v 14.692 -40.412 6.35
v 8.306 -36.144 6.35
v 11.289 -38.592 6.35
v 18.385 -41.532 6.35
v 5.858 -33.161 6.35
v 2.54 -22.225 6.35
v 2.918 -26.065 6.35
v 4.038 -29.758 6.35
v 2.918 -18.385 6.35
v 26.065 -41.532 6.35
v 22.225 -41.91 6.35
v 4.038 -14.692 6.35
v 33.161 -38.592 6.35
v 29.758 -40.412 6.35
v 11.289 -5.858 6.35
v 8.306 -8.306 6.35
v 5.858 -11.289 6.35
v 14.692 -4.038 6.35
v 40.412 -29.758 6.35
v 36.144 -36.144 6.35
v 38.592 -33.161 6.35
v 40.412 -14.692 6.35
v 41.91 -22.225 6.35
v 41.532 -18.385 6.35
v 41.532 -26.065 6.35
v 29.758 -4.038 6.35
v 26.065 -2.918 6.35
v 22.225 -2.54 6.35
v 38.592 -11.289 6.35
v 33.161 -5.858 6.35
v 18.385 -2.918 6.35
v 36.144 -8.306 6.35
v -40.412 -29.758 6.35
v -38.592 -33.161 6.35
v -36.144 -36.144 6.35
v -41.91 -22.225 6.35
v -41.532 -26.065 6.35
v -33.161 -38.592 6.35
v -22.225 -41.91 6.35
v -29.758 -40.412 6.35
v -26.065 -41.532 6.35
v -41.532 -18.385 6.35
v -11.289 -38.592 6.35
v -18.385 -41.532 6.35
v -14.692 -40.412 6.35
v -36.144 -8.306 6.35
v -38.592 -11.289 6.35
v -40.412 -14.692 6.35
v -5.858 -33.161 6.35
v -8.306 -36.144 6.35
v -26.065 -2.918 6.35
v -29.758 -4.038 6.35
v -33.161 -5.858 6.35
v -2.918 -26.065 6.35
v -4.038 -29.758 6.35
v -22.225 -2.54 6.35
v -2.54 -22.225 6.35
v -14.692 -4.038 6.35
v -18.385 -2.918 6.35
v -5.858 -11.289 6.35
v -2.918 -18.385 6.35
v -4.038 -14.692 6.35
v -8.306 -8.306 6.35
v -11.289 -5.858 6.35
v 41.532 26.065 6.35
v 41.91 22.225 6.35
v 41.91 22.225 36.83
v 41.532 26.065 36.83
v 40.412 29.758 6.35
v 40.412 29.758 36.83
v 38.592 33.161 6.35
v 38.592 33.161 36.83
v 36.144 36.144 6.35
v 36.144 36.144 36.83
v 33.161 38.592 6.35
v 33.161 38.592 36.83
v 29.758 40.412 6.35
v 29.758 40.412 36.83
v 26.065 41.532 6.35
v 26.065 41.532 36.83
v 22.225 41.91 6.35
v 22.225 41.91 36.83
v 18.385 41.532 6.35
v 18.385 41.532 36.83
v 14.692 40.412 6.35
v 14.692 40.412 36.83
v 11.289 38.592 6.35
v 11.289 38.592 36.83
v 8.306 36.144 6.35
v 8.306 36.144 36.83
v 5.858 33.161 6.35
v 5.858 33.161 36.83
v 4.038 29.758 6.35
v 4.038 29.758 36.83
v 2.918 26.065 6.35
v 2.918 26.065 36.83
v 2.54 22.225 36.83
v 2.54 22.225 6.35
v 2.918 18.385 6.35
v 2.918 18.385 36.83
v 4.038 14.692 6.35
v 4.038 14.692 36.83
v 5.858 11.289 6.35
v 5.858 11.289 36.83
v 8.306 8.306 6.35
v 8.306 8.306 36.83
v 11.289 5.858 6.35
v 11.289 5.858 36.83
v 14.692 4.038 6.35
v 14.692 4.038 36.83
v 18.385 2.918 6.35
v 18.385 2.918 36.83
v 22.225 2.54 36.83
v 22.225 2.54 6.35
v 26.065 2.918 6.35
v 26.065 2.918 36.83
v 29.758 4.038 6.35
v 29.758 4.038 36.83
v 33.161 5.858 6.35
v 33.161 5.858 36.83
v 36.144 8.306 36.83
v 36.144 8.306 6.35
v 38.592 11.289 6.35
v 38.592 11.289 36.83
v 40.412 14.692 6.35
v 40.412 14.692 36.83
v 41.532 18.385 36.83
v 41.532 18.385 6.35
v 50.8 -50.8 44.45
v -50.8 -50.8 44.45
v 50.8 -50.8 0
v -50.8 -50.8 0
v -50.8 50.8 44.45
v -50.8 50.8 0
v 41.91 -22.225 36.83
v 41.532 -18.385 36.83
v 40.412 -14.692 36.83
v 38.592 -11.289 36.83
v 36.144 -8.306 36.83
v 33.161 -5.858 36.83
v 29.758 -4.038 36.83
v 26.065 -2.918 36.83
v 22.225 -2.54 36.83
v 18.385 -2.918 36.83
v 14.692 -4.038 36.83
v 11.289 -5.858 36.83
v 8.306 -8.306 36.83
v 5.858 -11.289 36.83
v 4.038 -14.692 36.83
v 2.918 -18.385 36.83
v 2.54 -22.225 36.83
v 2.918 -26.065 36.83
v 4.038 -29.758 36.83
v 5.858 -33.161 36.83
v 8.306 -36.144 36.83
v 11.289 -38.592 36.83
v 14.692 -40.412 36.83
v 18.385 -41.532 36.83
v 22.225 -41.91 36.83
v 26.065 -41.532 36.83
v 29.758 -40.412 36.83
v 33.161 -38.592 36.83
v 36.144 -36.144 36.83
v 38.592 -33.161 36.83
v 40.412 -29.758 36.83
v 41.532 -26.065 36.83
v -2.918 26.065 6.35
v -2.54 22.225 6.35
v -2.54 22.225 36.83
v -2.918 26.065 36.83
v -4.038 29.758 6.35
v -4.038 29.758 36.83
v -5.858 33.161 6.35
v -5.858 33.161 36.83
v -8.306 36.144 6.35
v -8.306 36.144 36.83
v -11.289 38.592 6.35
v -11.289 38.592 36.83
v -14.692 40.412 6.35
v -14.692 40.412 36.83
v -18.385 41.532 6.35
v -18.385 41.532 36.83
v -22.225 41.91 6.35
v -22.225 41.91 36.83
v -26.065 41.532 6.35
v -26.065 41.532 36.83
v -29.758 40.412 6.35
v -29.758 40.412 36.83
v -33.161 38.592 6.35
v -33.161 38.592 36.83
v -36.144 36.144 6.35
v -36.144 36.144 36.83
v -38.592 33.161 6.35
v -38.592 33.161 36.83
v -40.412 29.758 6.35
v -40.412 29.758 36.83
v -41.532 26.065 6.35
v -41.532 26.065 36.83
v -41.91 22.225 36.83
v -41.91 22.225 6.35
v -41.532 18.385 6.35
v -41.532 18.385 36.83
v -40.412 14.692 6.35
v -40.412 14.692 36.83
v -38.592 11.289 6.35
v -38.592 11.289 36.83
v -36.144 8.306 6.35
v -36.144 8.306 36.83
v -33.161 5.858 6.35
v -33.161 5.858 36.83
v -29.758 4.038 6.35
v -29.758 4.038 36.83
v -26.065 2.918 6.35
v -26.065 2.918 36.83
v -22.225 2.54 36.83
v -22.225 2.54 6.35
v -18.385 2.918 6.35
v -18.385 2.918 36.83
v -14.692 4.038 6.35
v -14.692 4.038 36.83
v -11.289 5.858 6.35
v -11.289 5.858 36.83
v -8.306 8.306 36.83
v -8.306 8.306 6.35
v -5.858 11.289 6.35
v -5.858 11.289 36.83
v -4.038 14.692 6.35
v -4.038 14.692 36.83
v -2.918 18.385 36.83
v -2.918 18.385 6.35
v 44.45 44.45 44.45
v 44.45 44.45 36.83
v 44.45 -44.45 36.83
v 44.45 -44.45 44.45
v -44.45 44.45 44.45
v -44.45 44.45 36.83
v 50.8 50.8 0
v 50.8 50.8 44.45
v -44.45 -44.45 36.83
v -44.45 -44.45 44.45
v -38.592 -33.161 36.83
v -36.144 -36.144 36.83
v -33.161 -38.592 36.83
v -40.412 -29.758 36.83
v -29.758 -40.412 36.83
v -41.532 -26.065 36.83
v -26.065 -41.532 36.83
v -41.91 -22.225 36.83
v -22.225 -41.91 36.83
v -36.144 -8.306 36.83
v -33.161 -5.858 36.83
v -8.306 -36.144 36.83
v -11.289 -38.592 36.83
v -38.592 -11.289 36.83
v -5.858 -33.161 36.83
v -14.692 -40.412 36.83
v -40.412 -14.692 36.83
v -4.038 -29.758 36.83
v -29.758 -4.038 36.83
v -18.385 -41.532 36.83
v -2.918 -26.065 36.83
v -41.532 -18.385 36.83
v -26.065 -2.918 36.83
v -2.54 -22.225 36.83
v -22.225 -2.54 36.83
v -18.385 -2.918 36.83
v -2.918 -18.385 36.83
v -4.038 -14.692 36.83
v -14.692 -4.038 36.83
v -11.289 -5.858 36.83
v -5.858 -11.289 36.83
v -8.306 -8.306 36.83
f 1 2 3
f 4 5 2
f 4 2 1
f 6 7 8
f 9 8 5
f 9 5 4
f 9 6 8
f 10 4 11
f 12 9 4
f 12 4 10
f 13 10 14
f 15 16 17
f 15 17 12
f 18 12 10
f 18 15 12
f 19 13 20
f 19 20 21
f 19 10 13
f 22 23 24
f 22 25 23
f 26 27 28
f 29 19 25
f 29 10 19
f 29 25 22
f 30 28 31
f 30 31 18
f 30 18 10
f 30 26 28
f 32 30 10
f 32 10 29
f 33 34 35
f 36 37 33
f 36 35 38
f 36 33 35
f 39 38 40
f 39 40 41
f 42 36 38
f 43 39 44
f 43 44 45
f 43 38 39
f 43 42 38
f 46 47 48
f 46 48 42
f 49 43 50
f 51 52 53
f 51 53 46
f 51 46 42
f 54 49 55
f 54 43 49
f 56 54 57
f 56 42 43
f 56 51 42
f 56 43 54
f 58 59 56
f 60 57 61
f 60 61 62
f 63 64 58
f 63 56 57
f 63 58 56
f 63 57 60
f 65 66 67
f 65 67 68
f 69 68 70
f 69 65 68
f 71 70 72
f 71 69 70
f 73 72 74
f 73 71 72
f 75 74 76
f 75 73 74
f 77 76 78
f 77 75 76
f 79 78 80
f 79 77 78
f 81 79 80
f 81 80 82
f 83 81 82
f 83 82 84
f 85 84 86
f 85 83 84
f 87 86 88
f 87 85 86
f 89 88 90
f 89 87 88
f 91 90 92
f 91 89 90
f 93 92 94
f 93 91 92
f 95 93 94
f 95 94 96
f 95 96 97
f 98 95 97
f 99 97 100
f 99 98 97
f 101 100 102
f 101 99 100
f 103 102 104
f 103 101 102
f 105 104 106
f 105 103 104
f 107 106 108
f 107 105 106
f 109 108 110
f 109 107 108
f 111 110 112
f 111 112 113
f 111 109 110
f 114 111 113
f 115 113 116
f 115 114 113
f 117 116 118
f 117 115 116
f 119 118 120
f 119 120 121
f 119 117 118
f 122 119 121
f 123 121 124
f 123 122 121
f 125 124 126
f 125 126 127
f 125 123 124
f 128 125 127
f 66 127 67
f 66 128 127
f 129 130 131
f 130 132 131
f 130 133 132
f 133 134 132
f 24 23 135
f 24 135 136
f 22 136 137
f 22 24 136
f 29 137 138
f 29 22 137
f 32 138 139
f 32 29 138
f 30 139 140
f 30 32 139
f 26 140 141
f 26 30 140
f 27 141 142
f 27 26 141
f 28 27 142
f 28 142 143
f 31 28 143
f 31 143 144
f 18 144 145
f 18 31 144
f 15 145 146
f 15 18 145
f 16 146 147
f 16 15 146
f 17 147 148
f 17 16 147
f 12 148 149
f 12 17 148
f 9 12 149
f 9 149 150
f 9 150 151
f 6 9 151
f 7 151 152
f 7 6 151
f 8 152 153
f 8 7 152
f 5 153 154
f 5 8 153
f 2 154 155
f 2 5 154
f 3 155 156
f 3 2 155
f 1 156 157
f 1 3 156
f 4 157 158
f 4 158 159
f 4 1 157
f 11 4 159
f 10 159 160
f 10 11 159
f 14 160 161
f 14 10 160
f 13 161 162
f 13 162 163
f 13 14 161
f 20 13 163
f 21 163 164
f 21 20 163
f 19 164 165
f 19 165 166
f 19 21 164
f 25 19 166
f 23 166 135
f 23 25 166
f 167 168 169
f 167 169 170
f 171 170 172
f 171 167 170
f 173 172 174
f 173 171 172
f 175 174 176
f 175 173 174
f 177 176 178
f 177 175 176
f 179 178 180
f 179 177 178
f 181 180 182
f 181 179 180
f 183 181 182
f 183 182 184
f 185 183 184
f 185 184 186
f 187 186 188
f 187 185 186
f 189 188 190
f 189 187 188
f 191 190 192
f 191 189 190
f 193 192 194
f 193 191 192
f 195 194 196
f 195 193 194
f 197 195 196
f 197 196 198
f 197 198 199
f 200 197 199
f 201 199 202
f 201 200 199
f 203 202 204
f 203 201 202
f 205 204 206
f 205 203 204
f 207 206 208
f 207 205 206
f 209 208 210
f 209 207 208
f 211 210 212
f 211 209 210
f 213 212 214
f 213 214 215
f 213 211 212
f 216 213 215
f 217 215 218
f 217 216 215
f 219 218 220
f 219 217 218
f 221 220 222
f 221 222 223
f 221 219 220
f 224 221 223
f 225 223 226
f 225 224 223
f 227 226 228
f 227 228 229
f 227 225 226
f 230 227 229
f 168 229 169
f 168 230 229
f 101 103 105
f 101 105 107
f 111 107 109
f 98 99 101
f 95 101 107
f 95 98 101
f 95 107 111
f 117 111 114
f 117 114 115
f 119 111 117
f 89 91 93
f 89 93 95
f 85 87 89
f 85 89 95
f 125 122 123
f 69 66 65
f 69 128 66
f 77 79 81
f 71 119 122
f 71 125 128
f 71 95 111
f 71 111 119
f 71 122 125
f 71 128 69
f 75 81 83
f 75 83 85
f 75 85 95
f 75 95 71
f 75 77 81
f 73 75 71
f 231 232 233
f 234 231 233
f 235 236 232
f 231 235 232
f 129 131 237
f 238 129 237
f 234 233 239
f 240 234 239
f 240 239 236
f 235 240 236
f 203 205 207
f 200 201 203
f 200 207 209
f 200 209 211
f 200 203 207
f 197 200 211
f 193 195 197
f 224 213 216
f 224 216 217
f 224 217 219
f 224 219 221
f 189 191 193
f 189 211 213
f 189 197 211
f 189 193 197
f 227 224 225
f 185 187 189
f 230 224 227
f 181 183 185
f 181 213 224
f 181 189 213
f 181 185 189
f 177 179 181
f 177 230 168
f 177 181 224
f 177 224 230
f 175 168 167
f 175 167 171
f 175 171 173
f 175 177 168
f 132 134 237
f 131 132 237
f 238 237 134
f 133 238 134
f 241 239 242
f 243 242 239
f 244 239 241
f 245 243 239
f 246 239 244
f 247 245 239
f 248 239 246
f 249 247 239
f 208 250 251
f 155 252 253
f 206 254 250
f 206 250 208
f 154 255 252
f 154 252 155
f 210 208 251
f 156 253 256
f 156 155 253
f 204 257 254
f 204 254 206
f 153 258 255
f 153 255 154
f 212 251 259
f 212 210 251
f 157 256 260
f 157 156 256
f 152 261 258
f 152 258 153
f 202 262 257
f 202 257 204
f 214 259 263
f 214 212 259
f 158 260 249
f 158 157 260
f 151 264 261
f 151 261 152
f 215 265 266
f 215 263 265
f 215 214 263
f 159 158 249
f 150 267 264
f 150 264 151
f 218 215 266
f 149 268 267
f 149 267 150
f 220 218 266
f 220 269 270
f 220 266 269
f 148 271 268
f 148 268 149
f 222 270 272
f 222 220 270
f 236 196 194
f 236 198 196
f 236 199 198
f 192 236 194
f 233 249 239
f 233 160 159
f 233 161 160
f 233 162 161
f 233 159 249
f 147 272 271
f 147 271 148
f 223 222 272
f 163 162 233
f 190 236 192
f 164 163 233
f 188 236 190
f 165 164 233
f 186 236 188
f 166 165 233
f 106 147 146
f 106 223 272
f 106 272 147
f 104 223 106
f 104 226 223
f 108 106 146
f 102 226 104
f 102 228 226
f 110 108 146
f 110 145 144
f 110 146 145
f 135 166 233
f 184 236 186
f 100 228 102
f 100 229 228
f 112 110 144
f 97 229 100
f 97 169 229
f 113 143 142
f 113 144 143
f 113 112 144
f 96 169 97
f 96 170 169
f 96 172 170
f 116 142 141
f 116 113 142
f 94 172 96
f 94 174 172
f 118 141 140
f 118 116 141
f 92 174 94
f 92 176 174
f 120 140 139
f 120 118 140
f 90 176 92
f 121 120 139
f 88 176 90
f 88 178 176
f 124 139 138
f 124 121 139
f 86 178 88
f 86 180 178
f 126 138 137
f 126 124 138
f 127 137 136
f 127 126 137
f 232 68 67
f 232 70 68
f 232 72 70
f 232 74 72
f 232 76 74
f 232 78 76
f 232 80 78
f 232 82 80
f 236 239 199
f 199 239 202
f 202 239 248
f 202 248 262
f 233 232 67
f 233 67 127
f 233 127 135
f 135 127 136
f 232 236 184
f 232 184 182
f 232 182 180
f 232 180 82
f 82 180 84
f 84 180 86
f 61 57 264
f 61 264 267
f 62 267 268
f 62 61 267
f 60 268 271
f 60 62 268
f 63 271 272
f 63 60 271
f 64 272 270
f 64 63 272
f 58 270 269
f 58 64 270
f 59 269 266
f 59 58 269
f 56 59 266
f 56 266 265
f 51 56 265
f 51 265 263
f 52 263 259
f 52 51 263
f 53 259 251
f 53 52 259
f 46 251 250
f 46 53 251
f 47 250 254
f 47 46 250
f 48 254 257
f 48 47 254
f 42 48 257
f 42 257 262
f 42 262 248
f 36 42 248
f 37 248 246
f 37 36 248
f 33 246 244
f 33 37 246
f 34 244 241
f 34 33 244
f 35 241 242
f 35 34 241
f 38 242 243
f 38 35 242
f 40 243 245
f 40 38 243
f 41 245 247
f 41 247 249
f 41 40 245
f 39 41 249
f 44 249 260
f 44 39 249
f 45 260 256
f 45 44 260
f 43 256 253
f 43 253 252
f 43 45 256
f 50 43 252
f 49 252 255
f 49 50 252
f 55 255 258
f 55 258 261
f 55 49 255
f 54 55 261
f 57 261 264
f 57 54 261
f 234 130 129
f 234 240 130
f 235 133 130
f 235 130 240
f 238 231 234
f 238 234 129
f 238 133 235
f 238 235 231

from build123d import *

# Parameters (mm, degrees)
F0_W     = 101.6
F0_H     = 101.6
F1_DEPTH = 6.35
F2_W     = 6.35
F2_H     = 88.9
F3_DEPTH = 38.1
F4_W     = 44.45
F4_H     = 44.45
F4_R     = 19.685
F5_DEPTH = 30.48


with BuildPart() as f1:
    # F0 (on Top) → F1 (new body)
    with BuildSketch(Plane.XY):
        Rectangle(F0_W, F0_H)
    extrude(amount=F1_DEPTH)

    # F2 (on face) → F3 (join)
    with BuildSketch(Plane.XY.offset(6.35)):
        Polygon((50.8, 50.8), (-50.8, 50.8), (-50.8, 44.45), (-44.45, 44.45), (44.45, 44.45), (50.8, 44.45), align=None)
        with Locations((-47.625, 0)):
            Rectangle(F2_W, F2_H)
        Polygon((50.8, -50.8), (50.8, 44.45), (44.45, 44.45), (44.45, -44.45), (44.45, -50.8), align=None)
        Polygon((-44.45, -44.45), (-50.8, -44.45), (-50.8, -50.8), (44.45, -50.8), (44.45, -44.45), align=None)
    extrude(amount=F3_DEPTH)

    # F4 (on face) → F5 (join)
    with BuildSketch(Plane.XY.offset(6.35)):
        with Locations((-22.225, 22.225)):
            Rectangle(F4_W, F4_H)
        with Locations((-22.225, 22.225)):
            Circle(F4_R, mode=Mode.SUBTRACT)
        with Locations((22.225, 22.225)):
            Rectangle(F4_W, F4_H)
        with Locations((22.225, 22.225)):
            Circle(F4_R, mode=Mode.SUBTRACT)
        with Locations((22.225, -22.225)):
            Rectangle(F4_W, F4_H)
        with Locations((22.225, -22.225)):
            Circle(F4_R, mode=Mode.SUBTRACT)
        with Locations((-22.225, -22.225)):
            Rectangle(F4_W, F4_H)
        with Locations((-22.225, -22.225)):
            Circle(F4_R, mode=Mode.SUBTRACT)
    extrude(amount=F5_DEPTH)


solid = f1.part
